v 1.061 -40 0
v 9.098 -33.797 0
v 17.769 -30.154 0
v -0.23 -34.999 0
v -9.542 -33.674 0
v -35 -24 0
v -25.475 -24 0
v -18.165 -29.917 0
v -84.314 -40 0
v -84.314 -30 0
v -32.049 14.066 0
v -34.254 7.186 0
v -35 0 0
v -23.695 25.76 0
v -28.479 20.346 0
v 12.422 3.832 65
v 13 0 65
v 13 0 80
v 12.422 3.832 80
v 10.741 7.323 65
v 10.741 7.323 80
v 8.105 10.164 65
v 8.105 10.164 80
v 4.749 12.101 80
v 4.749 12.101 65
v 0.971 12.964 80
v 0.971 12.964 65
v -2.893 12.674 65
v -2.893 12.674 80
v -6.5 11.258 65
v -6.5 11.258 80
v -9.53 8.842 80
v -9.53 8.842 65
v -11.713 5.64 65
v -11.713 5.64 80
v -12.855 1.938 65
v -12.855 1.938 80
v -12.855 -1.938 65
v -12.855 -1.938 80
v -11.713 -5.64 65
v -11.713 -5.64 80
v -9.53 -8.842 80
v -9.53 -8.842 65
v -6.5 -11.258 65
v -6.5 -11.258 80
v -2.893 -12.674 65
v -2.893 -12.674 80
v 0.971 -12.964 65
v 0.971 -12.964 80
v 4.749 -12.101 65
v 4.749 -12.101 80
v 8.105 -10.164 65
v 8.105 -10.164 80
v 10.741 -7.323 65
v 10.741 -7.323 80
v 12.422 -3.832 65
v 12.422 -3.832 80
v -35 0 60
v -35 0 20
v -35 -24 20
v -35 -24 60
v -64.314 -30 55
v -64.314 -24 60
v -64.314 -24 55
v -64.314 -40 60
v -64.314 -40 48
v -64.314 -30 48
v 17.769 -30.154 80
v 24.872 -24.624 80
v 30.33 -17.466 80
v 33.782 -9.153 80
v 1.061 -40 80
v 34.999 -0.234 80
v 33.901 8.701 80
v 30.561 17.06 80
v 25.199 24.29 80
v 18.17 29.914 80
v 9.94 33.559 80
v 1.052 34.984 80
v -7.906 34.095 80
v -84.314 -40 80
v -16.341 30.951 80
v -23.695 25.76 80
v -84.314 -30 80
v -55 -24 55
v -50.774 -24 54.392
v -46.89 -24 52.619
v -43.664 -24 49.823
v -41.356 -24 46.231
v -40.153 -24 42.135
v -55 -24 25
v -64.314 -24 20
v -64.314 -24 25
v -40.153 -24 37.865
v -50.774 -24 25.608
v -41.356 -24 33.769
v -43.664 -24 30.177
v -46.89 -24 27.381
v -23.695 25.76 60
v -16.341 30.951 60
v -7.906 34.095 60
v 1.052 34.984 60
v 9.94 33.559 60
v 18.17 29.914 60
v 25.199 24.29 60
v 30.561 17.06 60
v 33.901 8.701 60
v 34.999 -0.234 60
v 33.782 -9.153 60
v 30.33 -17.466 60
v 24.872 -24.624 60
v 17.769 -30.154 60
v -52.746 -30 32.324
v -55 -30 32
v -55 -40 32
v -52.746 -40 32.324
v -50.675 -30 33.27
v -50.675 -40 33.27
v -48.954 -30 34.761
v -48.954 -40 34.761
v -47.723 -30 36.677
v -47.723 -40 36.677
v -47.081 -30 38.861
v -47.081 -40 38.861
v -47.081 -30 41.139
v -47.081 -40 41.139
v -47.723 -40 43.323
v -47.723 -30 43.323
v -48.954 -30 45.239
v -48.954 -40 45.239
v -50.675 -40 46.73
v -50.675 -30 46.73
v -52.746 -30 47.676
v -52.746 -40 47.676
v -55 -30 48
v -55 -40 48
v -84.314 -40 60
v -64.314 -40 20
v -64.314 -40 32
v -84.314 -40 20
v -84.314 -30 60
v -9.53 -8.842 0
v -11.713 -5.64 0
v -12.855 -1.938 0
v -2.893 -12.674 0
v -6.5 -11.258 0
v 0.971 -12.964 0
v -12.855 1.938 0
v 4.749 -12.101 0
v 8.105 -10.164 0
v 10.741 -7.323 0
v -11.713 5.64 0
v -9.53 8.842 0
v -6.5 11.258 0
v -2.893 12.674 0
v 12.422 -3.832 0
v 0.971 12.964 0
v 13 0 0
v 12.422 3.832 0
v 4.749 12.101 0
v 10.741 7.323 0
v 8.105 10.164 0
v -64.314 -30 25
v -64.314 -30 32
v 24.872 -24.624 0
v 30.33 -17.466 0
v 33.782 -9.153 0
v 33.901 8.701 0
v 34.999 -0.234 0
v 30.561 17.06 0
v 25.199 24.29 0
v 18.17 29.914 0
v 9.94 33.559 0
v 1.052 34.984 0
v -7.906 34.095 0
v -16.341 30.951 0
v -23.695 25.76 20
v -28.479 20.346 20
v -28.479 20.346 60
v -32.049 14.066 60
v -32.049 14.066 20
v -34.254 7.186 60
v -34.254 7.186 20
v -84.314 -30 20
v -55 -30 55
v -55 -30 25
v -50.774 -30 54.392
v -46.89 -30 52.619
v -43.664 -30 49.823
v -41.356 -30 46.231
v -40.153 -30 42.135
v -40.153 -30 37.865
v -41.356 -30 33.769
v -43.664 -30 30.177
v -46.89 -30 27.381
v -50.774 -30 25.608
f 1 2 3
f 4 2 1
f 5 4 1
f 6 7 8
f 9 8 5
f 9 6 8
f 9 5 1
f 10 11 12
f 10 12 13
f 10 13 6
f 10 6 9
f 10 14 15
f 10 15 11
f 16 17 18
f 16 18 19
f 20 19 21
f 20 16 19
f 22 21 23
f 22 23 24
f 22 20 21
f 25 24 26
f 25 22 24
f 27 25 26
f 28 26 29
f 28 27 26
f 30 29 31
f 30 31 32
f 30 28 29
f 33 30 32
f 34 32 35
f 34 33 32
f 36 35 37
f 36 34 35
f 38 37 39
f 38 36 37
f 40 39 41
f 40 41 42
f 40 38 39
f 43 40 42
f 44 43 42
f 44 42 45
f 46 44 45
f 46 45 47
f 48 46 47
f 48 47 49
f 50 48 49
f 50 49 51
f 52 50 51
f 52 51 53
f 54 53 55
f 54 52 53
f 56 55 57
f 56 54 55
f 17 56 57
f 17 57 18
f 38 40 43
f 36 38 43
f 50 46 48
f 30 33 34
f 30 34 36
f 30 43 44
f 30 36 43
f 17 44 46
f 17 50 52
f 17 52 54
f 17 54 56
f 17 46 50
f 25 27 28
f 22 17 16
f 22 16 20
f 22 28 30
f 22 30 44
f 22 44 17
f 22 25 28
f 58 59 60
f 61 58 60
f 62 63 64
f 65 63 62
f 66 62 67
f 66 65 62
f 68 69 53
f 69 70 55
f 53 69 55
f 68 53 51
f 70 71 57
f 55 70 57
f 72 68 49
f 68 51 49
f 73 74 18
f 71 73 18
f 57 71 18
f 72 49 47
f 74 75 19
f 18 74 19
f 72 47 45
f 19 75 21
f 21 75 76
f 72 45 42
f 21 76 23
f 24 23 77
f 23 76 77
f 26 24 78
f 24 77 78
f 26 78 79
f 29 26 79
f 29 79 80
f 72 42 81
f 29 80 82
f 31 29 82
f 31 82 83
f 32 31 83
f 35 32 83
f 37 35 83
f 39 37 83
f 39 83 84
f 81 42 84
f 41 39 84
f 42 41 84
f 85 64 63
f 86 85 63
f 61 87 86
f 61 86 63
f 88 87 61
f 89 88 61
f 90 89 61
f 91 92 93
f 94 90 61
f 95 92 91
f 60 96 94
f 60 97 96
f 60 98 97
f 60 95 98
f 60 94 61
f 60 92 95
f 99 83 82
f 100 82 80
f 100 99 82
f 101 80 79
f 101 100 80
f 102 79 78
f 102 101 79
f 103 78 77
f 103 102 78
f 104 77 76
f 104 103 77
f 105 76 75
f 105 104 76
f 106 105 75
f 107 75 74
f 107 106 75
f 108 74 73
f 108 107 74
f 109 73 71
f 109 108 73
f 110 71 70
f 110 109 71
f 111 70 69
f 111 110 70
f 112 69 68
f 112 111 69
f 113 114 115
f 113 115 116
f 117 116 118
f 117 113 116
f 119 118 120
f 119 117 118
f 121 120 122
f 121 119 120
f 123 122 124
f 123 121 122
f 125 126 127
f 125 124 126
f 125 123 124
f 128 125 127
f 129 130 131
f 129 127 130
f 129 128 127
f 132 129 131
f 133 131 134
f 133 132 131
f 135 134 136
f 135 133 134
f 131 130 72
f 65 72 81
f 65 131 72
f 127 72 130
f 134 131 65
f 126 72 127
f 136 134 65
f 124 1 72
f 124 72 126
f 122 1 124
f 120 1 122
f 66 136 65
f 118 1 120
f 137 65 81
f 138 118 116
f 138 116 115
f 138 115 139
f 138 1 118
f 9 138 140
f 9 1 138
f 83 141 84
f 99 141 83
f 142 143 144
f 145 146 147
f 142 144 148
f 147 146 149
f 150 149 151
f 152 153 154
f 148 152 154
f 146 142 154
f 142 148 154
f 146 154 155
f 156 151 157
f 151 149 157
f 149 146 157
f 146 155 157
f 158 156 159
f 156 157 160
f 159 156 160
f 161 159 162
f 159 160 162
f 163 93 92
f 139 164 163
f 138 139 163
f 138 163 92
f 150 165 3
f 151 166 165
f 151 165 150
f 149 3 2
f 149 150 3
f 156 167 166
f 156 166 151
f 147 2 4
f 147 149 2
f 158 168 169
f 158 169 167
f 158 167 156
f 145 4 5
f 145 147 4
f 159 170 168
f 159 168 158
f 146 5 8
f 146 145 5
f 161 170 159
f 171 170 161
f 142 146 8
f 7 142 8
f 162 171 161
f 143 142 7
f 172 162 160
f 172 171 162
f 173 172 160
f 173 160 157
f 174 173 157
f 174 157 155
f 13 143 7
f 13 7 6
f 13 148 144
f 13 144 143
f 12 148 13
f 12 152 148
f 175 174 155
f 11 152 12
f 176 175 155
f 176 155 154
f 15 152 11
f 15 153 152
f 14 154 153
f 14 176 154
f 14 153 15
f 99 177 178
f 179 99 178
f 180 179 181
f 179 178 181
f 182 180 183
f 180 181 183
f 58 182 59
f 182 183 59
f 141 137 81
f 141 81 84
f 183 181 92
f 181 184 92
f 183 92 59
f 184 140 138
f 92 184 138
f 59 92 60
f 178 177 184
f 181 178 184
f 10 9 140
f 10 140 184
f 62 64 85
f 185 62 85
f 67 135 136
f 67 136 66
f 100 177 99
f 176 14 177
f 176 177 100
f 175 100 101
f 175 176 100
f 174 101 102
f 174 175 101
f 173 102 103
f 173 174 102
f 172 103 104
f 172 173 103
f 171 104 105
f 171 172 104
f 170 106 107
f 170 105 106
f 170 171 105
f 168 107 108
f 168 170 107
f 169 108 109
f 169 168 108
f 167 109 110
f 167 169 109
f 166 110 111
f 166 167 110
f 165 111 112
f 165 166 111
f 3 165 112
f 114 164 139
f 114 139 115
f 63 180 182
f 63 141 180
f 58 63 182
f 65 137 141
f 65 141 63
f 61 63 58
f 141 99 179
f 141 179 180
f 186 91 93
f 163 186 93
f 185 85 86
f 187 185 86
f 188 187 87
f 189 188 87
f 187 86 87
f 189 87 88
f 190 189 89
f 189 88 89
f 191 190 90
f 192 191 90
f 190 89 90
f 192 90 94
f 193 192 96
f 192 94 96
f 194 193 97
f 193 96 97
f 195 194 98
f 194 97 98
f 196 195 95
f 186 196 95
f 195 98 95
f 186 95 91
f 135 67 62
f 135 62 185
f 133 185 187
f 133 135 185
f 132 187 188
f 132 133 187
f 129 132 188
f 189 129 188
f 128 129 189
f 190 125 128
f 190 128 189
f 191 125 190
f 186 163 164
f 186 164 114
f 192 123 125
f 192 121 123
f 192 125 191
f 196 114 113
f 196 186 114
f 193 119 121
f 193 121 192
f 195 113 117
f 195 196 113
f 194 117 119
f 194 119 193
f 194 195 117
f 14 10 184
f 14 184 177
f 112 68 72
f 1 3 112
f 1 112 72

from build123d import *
from build123d.topology import SkipClean

# Parameters (mm, degrees)
EXTRUDE_1_DEPTH          = 80
SKETCH_2_R               = 13
CUT_EXTRUDE_2_DEPTH      = 15
CUT_EXTRUDE_START        = -15
SKETCH_4_R               = 13
CUT_EXTRUDE_3_DEPTH      = 15
CUT_EXTRUDE_4_DEPTH      = 123.918354375
CUT_EXTRUDE_4_DEPTH_BACK = 123.918354375
SKETCH_5_W               = 20
SKETCH_5_H               = 40
CUT_EXTRUDE_6_DEPTH      = 123.918354375
CUT_EXTRUDE_6_DEPTH_BACK = 24
CUT_EXTRUDE_7_DEPTH      = 131.345394404
CUT_EXTRUDE_8_DEPTH      = 32
CUT_EXTRUDE_8_DEPTH_BACK = 24
SKETCH_10_W              = 30
SKETCH_10_H              = 40
CUT_EXTRUDE_9_DEPTH      = 6
SKETCH_13_W              = 10.619852086
SKETCH_13_H              = 40
CUT_EXTRUDE_10_DEPTH     = 71
EXTRUDE_3_DEPTH          = 60


with BuildPart() as part:
    # Эскиз1 → Бобышка-Вытянуть1 (new body)
    with BuildSketch(Plane.XY):
        with BuildLine():
            Line((-84.314422505, -30), (-23.694570419, 25.759800711))
            ThreePointArc((-23.694570419, 25.759800711), (28.113366731, 20.847988178), (17.769230769, -30.153846154))
            Line((17.769230769, -30.153846154), (1.060606061, -40))
            Line((1.060606061, -40), (-84.314422505, -40))
            Line((-84.314422505, -40), (-84.314422505, -30))
        make_face()
    extrude(amount=EXTRUDE_1_DEPTH)

    # Эскиз2 → Вырез-Вытянуть2 (cut)
    with BuildSketch(Plane.XY):
        Circle(SKETCH_2_R)
    extrude(amount=CUT_EXTRUDE_2_DEPTH, mode=Mode.SUBTRACT)

    # Эскиз4 → Вырез-Вытянуть3 (cut)
    with BuildSketch(Plane.XY.offset(80).offset(CUT_EXTRUDE_START)):
        Circle(SKETCH_4_R)
    extrude(amount=CUT_EXTRUDE_3_DEPTH, mode=Mode.SUBTRACT)

    # Эскиз5 → Вырез-Вытянуть4 (cut, two sides: drawn at the far end of the back side and taken through both)
    with BuildSketch(Plane(origin=(0, 0, 0), x_dir=(1, 0, 0), z_dir=(0, 1, 0)).offset(-CUT_EXTRUDE_4_DEPTH_BACK)):
        with Locations((-74.314422505, -40)):
            Rectangle(SKETCH_5_W, SKETCH_5_H)
    extrude(amount=CUT_EXTRUDE_4_DEPTH + CUT_EXTRUDE_4_DEPTH_BACK, mode=Mode.SUBTRACT)

    # Эскиз6 → Вырез-Вытянуть6 (cut, two sides: drawn at the far end of the back side and taken through both)
    with BuildSketch(Plane(origin=(0, 0, 0), x_dir=(1, 0, 0), z_dir=(0, 1, 0)).offset(-CUT_EXTRUDE_6_DEPTH_BACK)):
        with BuildLine():
            Line((-55, -25), (-84.314422505, -25))
            Line((-84.314422505, -25), (-84.314422505, -55))
            Line((-84.314422505, -55), (-55, -55))
            ThreePointArc((-55, -55), (-40, -40), (-55, -25))
        make_face()
    extrude(amount=CUT_EXTRUDE_6_DEPTH + CUT_EXTRUDE_6_DEPTH_BACK, mode=Mode.SUBTRACT)

    # Эскиз9 → Вырез-Вытянуть7 (cut, through all)
    with BuildSketch(Plane(origin=(0, -24, 0), x_dir=(1, 0, 0), z_dir=(0, 1, 0))):
        with BuildLine():
            Line((-55, -48), (-92.733432528, -48))
            Line((-92.733432528, -48), (-92.733432528, -32))
            Line((-92.733432528, -32), (-55, -32))
            ThreePointArc((-55, -32), (-47, -40), (-55, -48))
        make_face()
    extrude(amount=-CUT_EXTRUDE_7_DEPTH, mode=Mode.SUBTRACT)

    # Эскиз10 → Вырез-Вытянуть8 (cut, two sides: drawn at the far end of the back side and taken through both)
    with BuildSketch(Plane(origin=(0, 0, 0), x_dir=(1, 0, 0), z_dir=(0, 1, 0)).offset(-CUT_EXTRUDE_8_DEPTH_BACK)):
        with Locations((-49.314422505, -40)):
            Rectangle(SKETCH_10_W, SKETCH_10_H)
    extrude(amount=CUT_EXTRUDE_8_DEPTH + CUT_EXTRUDE_8_DEPTH_BACK, mode=Mode.SUBTRACT)

    # Эскиз11 → Вырез-Вытянуть9 (cut)
    with BuildSketch(Plane(origin=(0, -24, 0), x_dir=(1, 0, 0), z_dir=(0, 1, 0))):
        with BuildLine():
            Line((-55, -25), (-81.861005174, -25))
            Line((-81.861005174, -25), (-81.861005174, -55))
            Line((-81.861005174, -55), (-55, -55))
            ThreePointArc((-55, -55), (-40, -40), (-55, -25))
        make_face()
    extrude(amount=-CUT_EXTRUDE_9_DEPTH, mode=Mode.SUBTRACT)

    # Эскиз13 → Вырез-Вытянуть10 (cut)
    with BuildSketch(Plane(origin=(0, -24, 0), x_dir=(1, 0, 0), z_dir=(0, 1, 0))):
        with Locations((-29.004496462, -40)):
            Rectangle(SKETCH_13_W, SKETCH_13_H)
    extrude(amount=CUT_EXTRUDE_10_DEPTH, mode=Mode.SUBTRACT)

    # Эскиз12 → Бобышка-Вытянуть3 (add)
    with SkipClean():  # the faces are left unmerged after this step: merging them gives an invalid solid
        with BuildSketch(Plane.XY):
            with BuildLine():
                Line((-35, 0), (-35, -24))
                Line((-35, -24), (-25.475478406, -24))
                ThreePointArc((-25.475478406, -24), (32.53184397, 12.9104271), (-35, 0))
            make_face()
        extrude(amount=EXTRUDE_3_DEPTH)


solid = part.part
